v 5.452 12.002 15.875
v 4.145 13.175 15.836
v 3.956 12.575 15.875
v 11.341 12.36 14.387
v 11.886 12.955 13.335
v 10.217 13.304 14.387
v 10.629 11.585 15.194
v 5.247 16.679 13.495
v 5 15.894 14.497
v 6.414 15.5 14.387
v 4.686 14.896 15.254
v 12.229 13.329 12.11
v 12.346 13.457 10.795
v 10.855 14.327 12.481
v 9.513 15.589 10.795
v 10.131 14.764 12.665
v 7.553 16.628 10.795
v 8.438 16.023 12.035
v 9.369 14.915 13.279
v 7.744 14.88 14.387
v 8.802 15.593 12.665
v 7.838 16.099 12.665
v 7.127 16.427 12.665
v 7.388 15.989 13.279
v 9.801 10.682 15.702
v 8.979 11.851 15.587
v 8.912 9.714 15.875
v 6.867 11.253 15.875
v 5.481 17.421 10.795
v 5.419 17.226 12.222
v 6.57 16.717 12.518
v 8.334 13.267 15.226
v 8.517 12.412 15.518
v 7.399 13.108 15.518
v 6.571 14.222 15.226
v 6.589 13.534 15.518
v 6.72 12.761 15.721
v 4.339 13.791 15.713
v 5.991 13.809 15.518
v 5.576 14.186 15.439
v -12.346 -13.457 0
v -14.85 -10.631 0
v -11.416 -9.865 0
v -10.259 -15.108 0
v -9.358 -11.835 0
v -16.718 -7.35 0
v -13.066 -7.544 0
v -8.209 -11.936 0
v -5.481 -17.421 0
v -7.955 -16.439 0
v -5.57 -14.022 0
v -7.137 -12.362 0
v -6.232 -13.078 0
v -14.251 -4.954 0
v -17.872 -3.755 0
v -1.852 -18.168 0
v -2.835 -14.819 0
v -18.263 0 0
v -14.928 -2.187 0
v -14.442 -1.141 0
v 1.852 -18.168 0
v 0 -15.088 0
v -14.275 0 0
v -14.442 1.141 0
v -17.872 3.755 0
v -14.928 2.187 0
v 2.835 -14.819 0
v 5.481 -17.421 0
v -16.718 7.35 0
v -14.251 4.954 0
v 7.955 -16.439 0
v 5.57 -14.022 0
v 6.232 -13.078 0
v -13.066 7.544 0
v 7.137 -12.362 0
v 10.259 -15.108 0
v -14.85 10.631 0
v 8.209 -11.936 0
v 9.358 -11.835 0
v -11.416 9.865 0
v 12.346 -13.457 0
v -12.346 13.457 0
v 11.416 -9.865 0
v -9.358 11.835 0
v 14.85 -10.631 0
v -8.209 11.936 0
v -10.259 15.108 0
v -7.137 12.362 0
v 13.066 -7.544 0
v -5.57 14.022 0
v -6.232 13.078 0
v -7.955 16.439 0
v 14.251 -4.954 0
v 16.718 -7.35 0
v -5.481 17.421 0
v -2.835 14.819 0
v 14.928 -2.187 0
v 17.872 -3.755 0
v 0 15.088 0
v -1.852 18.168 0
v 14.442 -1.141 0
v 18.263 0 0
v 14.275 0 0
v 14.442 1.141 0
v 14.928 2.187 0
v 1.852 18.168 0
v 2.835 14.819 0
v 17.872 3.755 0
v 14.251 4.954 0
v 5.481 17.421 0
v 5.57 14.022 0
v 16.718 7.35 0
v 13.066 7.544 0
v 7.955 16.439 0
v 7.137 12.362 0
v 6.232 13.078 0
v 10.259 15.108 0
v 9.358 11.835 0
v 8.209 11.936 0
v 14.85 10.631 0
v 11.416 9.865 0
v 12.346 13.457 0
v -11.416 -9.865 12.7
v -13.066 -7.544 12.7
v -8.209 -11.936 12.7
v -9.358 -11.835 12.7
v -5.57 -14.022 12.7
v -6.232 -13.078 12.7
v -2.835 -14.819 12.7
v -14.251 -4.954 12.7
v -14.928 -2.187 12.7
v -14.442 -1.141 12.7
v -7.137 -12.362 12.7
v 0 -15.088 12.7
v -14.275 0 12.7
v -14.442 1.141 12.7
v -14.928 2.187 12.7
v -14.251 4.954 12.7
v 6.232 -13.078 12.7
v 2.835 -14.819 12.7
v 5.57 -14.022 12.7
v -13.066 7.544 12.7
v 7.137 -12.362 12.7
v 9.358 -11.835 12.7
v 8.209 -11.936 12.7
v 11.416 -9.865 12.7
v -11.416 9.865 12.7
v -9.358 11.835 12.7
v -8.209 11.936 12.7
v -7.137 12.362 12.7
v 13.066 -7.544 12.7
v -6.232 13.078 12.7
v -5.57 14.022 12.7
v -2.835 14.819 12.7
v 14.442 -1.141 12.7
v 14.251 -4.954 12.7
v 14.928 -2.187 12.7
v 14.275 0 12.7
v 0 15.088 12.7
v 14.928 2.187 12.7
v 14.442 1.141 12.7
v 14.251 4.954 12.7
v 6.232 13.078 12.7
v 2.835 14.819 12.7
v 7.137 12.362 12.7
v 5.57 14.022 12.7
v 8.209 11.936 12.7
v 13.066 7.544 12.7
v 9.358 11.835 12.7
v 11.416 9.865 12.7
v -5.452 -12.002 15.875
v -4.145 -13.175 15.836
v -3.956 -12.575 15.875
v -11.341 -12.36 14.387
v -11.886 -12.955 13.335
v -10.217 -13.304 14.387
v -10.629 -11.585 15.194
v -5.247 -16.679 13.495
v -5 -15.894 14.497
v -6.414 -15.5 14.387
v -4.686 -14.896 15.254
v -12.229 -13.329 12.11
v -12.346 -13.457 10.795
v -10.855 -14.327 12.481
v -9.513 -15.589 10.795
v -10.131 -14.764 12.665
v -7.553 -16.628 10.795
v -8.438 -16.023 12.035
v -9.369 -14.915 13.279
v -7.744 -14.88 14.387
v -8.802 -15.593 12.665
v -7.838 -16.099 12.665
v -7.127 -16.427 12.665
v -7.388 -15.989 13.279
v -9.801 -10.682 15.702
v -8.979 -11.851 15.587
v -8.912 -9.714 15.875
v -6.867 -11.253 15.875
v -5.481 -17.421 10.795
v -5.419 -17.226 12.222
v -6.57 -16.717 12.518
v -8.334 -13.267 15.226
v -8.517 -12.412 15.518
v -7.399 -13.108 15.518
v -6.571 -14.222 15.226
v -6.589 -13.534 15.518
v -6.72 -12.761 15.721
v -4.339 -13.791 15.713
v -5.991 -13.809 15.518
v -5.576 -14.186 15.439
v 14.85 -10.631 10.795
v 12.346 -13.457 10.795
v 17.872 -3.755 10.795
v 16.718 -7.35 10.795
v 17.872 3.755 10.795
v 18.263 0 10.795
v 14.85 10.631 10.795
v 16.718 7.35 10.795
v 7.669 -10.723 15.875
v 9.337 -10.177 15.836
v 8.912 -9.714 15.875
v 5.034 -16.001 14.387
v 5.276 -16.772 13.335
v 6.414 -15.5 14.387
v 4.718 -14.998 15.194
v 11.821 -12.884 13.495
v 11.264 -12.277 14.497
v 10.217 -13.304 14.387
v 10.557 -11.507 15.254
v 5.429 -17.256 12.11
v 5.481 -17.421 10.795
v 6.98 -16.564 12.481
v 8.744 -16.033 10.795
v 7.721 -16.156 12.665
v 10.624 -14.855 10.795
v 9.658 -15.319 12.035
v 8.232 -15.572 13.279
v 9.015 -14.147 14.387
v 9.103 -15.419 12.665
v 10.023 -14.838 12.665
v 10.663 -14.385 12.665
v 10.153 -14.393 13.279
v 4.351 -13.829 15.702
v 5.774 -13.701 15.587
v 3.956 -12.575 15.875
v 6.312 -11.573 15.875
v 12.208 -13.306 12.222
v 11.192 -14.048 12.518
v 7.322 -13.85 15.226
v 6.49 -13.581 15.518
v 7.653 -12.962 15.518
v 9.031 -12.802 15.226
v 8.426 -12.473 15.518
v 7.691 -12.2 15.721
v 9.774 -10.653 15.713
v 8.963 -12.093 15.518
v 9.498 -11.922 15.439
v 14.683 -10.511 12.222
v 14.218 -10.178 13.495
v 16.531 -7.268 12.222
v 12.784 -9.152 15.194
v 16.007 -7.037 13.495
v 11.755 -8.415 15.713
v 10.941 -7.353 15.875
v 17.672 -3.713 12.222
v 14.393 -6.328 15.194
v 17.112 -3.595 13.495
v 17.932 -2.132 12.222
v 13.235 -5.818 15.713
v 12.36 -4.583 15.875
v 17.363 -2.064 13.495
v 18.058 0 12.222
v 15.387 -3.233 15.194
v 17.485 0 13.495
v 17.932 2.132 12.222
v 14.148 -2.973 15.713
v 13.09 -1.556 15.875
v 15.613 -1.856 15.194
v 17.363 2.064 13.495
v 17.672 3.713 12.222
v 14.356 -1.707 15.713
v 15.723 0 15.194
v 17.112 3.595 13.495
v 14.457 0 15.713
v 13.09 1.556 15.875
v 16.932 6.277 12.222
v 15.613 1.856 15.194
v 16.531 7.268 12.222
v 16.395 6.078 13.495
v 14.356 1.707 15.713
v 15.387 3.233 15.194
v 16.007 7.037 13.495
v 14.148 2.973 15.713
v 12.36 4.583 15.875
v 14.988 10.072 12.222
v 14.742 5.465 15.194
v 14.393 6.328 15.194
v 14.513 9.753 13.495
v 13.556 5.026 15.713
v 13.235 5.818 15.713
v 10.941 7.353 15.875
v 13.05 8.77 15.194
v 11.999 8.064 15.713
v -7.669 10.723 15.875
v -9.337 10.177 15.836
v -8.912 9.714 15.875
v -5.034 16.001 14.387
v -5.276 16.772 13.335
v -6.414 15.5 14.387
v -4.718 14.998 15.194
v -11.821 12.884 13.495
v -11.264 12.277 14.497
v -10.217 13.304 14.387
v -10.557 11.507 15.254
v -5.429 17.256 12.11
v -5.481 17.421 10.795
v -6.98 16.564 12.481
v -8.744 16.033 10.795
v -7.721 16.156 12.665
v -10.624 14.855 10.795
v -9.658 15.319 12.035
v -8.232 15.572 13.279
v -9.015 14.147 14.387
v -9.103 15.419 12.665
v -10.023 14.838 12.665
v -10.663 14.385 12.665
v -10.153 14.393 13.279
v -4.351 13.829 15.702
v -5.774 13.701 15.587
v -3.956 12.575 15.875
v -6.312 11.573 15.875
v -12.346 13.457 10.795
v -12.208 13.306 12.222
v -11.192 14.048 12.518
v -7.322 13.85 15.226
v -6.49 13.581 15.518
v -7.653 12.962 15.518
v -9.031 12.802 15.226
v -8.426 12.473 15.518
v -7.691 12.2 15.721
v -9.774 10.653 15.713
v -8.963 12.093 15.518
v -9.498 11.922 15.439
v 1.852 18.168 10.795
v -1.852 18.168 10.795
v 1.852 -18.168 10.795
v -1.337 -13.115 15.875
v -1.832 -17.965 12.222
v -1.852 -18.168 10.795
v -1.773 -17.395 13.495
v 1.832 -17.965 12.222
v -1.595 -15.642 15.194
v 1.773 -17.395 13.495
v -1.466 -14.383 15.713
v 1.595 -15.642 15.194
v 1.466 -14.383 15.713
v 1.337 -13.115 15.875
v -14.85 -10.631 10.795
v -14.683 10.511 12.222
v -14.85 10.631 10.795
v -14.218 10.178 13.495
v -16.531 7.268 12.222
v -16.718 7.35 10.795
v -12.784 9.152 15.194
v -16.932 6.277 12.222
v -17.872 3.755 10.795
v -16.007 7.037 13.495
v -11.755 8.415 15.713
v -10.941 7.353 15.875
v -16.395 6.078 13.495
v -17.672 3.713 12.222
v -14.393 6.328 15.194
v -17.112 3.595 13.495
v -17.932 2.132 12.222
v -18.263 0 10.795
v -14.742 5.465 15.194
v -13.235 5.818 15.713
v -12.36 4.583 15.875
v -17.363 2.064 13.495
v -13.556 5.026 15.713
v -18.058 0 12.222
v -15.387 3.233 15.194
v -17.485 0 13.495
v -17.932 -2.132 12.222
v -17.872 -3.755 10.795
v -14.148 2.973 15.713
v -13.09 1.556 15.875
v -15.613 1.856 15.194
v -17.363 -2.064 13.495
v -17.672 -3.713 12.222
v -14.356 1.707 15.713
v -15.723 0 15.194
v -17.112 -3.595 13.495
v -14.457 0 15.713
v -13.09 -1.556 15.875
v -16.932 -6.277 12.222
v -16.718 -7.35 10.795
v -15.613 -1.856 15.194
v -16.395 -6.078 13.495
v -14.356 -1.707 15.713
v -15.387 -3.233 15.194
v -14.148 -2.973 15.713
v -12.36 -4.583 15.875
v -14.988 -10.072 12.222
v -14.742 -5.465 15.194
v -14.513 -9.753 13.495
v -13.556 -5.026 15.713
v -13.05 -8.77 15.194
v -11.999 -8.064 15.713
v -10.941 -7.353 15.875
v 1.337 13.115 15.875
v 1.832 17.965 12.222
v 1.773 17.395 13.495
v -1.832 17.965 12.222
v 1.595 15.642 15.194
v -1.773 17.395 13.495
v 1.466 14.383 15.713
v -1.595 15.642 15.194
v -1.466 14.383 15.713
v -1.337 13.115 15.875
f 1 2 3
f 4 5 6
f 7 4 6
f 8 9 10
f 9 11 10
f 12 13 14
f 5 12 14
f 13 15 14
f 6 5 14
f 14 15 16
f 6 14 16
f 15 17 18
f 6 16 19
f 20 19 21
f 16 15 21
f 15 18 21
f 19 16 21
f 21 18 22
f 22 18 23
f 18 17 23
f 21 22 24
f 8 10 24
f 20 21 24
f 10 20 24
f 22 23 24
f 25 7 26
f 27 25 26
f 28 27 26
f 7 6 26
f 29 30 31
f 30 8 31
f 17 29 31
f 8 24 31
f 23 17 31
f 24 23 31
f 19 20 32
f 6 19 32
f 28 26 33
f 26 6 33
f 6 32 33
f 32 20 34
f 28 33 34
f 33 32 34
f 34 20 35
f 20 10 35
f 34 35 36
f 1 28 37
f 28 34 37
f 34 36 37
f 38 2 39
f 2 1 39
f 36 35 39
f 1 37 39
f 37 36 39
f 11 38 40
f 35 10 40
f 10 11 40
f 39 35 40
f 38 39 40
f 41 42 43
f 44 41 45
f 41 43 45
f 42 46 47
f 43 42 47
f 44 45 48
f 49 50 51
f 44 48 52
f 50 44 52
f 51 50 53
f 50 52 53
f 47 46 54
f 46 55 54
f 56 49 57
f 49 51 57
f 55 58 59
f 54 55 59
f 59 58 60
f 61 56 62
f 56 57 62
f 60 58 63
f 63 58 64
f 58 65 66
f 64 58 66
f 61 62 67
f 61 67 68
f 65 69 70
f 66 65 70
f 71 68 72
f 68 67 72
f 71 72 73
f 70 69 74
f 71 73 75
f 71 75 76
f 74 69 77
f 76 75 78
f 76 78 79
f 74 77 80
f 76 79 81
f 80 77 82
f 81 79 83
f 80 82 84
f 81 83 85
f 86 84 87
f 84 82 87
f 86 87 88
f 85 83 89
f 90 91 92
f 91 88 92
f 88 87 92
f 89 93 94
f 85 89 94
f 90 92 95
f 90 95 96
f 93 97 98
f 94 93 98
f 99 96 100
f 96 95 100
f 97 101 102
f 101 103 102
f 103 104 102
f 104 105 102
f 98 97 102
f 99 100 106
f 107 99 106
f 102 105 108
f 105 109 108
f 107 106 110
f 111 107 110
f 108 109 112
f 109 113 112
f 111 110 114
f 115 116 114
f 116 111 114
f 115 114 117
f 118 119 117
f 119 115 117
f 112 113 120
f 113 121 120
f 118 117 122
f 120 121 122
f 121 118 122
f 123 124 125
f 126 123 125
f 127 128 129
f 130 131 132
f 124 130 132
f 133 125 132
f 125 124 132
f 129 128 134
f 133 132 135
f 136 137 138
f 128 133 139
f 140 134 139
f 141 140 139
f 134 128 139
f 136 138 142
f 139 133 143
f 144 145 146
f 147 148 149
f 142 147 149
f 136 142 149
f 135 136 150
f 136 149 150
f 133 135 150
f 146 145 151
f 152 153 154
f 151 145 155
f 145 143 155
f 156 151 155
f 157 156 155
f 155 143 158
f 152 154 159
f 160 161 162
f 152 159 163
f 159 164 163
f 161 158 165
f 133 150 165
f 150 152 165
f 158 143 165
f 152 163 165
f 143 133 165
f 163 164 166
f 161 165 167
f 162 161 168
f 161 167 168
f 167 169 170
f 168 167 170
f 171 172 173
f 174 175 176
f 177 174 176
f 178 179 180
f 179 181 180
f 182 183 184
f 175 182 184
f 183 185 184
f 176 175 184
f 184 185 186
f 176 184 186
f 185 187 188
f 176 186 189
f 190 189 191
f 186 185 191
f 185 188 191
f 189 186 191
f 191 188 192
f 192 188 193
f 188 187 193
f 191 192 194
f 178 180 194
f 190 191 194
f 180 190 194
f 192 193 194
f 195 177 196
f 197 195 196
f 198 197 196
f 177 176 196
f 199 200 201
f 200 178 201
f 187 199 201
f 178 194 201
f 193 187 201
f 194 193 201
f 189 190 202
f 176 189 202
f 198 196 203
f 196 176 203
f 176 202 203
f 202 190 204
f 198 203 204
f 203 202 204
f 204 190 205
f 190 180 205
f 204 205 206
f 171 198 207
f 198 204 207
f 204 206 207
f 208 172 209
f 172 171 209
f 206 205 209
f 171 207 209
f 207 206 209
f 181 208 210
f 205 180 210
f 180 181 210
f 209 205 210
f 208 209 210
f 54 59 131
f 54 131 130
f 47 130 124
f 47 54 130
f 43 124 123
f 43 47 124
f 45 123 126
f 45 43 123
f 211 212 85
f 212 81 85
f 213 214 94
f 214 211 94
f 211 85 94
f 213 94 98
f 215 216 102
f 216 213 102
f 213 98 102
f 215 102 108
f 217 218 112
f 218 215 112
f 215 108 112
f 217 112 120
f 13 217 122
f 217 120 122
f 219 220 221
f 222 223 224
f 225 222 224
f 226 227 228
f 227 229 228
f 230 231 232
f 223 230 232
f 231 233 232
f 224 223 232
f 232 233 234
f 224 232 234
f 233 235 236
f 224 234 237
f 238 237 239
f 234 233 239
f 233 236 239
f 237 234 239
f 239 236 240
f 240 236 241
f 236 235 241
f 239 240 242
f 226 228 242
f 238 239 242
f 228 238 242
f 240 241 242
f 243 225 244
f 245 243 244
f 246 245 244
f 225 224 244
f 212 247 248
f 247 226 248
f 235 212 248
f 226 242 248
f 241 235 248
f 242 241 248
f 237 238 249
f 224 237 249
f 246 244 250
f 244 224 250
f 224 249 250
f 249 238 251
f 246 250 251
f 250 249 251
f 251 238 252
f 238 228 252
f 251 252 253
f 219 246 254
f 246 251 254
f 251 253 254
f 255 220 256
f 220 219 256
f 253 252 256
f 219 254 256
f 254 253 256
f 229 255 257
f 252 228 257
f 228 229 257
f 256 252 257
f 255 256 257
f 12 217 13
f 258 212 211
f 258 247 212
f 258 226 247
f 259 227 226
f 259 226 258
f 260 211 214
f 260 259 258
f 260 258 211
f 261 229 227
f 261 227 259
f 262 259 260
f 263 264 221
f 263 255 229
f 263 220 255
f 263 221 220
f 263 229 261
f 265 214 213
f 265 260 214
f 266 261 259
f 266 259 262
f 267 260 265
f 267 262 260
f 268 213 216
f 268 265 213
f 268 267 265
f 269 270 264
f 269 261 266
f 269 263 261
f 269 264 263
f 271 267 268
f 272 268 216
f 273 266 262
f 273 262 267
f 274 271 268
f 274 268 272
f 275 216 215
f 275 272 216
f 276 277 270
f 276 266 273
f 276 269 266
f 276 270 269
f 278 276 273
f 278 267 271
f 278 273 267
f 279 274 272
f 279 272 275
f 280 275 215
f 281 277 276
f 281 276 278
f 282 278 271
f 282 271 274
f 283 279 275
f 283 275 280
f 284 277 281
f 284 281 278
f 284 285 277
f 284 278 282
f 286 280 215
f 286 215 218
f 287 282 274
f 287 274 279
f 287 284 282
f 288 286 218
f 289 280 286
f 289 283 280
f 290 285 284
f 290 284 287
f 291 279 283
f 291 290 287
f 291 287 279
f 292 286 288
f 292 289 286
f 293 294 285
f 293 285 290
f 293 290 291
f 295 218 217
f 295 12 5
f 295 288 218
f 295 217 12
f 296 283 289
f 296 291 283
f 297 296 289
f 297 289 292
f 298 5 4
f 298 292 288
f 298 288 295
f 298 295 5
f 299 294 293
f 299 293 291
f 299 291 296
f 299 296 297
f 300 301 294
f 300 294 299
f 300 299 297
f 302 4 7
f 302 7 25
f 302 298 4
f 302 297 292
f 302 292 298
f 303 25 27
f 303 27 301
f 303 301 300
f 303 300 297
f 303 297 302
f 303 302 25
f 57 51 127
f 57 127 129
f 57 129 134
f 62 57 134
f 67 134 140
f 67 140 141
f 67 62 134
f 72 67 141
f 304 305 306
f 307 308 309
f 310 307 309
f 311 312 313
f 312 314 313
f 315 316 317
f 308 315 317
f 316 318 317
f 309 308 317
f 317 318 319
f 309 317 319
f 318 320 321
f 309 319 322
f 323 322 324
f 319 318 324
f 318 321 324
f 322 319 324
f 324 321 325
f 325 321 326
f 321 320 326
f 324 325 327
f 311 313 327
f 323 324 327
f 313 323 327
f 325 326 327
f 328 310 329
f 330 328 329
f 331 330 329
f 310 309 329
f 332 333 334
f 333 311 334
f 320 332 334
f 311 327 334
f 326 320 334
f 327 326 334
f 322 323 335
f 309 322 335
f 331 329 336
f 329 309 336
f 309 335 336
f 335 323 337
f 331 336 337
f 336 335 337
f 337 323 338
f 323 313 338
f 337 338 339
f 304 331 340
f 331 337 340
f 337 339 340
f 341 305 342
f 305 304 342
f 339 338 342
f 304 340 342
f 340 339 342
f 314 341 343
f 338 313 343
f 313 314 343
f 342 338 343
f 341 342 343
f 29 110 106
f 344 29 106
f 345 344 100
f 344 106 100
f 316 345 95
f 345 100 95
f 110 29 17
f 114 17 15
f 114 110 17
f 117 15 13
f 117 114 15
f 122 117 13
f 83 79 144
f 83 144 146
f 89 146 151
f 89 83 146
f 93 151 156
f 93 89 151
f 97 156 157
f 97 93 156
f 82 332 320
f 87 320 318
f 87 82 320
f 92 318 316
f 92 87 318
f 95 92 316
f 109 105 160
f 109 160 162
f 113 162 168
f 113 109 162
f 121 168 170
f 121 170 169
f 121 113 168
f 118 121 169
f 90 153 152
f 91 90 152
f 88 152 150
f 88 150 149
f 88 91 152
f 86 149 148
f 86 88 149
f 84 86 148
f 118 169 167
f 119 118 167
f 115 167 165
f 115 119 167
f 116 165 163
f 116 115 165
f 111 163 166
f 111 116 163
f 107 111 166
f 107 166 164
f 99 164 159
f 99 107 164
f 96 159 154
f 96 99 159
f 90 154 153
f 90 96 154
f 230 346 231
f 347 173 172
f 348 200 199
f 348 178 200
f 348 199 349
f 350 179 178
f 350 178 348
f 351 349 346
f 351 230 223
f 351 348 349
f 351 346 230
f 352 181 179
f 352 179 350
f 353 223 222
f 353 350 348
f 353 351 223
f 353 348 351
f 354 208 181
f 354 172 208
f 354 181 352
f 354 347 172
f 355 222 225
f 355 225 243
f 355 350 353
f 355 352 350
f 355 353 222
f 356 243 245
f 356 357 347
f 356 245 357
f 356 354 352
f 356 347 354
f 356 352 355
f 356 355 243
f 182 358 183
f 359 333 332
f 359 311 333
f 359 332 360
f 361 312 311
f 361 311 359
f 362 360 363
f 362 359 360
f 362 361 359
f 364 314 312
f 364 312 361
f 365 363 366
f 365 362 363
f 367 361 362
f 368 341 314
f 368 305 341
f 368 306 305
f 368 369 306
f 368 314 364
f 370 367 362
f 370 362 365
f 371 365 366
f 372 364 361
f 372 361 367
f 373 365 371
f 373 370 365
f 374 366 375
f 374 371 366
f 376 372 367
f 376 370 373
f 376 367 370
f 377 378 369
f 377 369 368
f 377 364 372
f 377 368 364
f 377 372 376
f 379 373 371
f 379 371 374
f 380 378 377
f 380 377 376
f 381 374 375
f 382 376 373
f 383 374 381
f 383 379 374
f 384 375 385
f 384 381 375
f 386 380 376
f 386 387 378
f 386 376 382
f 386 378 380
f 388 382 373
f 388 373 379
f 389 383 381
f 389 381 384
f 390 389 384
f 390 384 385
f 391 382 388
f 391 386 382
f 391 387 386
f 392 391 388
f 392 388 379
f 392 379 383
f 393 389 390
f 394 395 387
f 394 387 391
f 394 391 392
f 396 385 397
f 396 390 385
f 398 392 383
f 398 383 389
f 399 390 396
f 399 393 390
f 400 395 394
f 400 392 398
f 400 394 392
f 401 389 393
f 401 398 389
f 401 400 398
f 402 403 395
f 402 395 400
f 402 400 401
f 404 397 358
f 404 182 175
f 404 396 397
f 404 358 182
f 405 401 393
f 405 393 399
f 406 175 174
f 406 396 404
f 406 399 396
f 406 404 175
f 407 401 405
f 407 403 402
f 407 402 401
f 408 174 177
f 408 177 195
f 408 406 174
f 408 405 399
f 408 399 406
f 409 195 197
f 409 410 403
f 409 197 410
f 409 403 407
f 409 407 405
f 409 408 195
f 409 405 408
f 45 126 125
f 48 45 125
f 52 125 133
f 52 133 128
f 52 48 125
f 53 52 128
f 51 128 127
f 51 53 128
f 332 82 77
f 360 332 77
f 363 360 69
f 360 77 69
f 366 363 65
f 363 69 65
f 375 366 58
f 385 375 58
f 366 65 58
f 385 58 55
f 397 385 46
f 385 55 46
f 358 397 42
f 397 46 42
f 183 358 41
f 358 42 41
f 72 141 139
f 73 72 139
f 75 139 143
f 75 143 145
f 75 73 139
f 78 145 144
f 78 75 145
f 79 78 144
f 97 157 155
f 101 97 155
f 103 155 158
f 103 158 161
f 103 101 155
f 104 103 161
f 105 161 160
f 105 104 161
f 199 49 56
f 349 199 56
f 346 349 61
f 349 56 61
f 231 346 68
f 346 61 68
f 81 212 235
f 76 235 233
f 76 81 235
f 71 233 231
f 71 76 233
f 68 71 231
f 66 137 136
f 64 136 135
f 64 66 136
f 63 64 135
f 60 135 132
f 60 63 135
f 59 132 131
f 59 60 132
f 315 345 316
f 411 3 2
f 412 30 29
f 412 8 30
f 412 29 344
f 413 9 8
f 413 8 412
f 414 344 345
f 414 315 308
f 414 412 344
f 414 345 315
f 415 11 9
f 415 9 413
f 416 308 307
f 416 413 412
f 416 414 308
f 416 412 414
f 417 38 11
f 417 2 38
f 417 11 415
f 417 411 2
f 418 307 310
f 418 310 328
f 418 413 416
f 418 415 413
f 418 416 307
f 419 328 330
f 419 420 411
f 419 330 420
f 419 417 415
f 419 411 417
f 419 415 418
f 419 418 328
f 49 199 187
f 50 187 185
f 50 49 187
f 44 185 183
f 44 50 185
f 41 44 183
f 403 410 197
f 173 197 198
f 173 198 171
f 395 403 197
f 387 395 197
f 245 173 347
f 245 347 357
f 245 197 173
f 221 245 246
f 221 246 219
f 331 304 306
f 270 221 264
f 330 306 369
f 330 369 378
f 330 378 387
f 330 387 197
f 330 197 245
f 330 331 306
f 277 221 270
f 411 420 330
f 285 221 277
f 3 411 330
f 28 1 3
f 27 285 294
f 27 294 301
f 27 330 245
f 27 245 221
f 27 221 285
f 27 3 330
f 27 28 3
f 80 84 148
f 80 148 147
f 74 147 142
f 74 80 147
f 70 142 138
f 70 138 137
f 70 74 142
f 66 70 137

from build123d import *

# Parameters (mm, degrees)
F1_R     = 18.2626
F1_R_2   = 15.0876
F2_DEPTH = 12.7
F3_R     = 18.2626
F4_DEPTH = 3.175
F6_DEPTH = 12.7
F7_R     = 5.08


with BuildPart() as f2:
    # F1 (on Top) → F2 (new body)
    with BuildSketch(Plane.XY):
        Circle(F1_R)
        Circle(F1_R_2, mode=Mode.SUBTRACT)
    extrude(amount=F2_DEPTH)

    # F3 (on face) → F4 (join)
    with BuildSketch(Plane.XY.offset(12.7)):
        Circle(F3_R)
    extrude(amount=F4_DEPTH)

    # F5 (on face) → F6 (join, through all)
    with BuildSketch(Plane(origin=(0, 0, 0), x_dir=(1, 0, 0), z_dir=(0, 0, -1))):
        with BuildLine():
            ThreePointArc((-17.827214, 3.963961), (-18.2626, 0), (-17.827214, -3.963961))
            ThreePointArc((-17.827214, -3.963961), (-14.2748, 0), (-17.827214, 3.963961))
        make_face()
        with BuildLine():
            ThreePointArc((-12.346498, -13.45684), (-9.1313, -15.815876), (-5.480716, -17.420801))
            ThreePointArc((-5.480716, -17.420801), (-7.1374, -12.362339), (-12.346498, -13.45684))
        make_face()
        with BuildLine():
            ThreePointArc((5.480716, -17.420801), (9.1313, -15.815876), (12.346498, -13.45684))
            ThreePointArc((12.346498, -13.45684), (7.1374, -12.362339), (5.480716, -17.420801))
        make_face()
        with BuildLine():
            ThreePointArc((17.827214, -3.963961), (18.2626, 0), (17.827214, 3.963961))
            ThreePointArc((17.827214, 3.963961), (14.2748, 0), (17.827214, -3.963961))
        make_face()
        with BuildLine():
            ThreePointArc((12.346498, 13.45684), (9.1313, 15.815876), (5.480716, 17.420801))
            ThreePointArc((5.480716, 17.420801), (7.1374, 12.362339), (12.346498, 13.45684))
        make_face()
        with BuildLine():
            ThreePointArc((-5.480716, 17.420801), (-9.1313, 15.815876), (-12.346498, 13.45684))
            ThreePointArc((-12.346498, 13.45684), (-7.1374, 12.362339), (-5.480716, 17.420801))
        make_face()
    extrude(amount=-F6_DEPTH)

    # F7
    f7_edges = [f2.edges().sort_by_distance(p)[0] for p in [
        (-18.2626, 0, 15.875),
    ]]
    fillet(f7_edges, radius=F7_R)


solid = f2.part
